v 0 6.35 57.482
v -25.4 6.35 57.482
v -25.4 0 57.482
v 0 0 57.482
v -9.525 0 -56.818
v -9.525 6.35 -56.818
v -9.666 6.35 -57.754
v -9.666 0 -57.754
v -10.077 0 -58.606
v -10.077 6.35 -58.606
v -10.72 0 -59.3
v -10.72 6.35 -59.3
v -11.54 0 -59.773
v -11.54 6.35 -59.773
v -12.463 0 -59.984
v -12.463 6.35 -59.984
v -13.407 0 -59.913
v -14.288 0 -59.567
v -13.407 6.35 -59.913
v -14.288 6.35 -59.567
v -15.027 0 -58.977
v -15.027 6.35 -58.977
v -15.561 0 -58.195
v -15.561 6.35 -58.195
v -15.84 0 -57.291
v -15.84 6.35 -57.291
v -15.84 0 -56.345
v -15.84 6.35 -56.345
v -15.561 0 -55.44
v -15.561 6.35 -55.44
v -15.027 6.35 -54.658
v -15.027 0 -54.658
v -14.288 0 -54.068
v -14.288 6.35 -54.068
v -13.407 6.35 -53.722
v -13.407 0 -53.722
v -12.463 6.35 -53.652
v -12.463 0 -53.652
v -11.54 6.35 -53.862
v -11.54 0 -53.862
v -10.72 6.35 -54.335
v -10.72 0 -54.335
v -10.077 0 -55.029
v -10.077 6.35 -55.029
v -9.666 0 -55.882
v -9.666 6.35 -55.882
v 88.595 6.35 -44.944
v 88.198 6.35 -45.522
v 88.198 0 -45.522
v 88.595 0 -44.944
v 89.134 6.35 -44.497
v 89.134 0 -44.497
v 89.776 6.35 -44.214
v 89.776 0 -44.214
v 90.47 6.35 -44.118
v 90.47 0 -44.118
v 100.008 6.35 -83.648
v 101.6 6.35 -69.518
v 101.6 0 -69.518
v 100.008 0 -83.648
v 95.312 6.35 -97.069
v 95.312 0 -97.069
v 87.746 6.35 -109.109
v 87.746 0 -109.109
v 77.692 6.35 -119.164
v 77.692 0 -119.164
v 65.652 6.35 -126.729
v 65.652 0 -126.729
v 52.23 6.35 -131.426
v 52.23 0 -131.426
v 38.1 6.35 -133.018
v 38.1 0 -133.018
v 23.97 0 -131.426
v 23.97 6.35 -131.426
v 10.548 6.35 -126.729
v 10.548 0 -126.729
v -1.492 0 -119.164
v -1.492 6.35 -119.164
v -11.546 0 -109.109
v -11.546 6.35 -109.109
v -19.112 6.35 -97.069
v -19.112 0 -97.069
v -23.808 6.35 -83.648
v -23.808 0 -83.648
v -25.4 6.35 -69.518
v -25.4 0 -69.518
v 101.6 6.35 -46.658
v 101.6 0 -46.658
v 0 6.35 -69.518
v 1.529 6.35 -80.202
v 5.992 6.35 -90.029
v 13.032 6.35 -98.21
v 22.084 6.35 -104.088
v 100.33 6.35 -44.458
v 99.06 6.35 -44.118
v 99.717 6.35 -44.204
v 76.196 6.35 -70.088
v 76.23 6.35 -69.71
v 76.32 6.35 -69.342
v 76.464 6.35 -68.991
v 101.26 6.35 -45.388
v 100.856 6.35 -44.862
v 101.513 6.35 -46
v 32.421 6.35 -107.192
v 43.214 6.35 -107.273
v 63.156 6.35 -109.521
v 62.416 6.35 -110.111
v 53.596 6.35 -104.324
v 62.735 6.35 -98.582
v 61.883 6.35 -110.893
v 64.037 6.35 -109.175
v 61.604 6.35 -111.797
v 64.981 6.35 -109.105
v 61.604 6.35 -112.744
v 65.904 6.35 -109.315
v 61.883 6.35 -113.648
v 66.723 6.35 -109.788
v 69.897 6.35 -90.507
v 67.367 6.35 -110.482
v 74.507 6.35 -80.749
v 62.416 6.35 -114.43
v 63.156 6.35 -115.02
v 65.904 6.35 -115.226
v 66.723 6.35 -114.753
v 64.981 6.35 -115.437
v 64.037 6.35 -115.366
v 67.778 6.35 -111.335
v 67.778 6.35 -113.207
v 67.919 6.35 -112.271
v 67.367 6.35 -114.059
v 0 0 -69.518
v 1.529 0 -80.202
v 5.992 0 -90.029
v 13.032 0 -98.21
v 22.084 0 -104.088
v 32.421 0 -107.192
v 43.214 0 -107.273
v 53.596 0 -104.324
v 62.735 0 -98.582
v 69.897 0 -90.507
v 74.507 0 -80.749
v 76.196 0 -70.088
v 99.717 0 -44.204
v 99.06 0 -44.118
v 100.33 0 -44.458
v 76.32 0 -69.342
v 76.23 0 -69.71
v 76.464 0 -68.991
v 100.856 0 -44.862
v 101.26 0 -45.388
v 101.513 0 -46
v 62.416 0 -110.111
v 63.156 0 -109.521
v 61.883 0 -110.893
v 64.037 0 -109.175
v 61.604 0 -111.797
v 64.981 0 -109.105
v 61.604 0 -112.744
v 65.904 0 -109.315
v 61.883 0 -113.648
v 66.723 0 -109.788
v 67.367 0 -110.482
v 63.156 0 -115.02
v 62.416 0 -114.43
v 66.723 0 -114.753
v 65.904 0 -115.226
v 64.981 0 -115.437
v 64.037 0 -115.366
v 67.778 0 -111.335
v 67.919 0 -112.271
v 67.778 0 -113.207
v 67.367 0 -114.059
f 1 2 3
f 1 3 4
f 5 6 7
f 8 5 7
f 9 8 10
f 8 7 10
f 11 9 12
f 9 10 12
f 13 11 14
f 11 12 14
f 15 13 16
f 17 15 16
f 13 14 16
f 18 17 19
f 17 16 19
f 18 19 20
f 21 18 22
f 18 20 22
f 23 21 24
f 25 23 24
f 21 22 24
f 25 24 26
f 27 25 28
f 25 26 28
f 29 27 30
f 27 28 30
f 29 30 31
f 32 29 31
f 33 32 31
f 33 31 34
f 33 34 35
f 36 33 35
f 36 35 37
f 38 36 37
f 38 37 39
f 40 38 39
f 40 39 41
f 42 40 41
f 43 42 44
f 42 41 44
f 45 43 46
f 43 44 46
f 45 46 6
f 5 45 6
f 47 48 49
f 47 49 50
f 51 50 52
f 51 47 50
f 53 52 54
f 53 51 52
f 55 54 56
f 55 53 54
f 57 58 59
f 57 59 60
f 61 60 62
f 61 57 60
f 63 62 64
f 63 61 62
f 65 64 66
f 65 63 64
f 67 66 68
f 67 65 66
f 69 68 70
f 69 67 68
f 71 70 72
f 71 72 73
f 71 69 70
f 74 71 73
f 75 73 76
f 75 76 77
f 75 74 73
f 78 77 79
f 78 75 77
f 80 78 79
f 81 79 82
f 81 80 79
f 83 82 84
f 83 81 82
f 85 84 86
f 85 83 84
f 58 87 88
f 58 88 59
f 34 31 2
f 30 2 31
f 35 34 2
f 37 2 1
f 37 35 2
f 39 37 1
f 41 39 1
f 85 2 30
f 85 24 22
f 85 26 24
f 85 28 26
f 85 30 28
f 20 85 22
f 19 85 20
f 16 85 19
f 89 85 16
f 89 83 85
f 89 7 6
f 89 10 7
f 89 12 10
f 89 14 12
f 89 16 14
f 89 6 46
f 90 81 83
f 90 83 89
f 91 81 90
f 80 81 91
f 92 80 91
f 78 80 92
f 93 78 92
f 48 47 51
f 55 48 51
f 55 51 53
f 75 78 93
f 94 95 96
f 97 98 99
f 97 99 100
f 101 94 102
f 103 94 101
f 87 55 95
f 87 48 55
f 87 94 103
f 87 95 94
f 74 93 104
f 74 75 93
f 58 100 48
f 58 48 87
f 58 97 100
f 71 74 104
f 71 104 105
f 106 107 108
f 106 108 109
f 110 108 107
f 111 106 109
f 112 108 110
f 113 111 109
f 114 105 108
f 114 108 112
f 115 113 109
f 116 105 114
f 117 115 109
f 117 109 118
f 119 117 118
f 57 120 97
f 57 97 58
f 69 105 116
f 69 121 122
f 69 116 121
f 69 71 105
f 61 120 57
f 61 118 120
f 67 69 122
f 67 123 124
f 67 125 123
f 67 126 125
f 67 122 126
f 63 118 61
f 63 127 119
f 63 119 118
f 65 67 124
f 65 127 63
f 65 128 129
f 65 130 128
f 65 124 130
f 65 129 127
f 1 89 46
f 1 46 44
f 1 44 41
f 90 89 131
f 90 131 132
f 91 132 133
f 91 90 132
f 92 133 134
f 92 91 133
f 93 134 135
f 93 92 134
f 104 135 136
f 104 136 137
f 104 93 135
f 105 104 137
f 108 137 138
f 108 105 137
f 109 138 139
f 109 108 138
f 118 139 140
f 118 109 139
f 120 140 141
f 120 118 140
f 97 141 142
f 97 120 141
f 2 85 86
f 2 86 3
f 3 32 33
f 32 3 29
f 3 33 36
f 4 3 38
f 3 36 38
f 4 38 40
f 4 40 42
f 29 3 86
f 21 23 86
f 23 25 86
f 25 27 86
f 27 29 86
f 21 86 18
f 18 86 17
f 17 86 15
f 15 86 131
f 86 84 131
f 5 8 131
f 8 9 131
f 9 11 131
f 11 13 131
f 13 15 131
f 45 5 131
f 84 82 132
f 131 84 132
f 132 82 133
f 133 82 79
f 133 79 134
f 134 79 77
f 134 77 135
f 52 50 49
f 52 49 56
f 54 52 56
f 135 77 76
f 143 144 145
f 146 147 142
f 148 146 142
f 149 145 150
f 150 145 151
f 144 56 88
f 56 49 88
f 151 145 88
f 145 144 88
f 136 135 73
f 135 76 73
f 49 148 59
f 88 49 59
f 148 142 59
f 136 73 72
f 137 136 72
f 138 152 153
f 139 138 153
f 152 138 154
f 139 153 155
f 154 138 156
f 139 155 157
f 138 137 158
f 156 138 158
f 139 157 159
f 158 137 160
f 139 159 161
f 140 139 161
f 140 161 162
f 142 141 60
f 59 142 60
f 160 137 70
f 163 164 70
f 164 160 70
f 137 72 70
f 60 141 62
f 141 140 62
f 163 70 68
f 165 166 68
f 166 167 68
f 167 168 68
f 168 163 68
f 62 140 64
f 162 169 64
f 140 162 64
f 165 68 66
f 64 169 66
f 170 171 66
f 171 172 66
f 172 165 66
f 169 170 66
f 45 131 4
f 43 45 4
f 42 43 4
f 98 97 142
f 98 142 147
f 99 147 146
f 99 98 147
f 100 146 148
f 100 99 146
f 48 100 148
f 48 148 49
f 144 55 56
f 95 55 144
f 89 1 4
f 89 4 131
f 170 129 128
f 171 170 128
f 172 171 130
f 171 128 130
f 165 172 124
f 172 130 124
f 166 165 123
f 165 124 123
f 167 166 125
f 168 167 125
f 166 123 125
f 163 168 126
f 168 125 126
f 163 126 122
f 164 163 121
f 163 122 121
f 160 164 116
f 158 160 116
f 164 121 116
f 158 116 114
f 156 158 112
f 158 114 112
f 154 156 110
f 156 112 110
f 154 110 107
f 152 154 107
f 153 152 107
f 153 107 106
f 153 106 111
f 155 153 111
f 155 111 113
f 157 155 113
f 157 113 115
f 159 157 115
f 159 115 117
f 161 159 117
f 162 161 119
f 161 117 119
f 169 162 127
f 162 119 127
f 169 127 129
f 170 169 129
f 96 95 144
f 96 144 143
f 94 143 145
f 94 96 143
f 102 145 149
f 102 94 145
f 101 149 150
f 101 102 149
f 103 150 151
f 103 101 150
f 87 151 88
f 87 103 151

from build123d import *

# Parameters (mm, degrees)
SKETCH1_R           = 3.175
BOSS_EXTRUDE1_DEPTH = 6.35


with BuildPart() as part:
    # Sketch1 → Boss-Extrude1 (new body)
    with BuildSketch(Plane(origin=(0, 6.35, 0), x_dir=(1, 0, 0), z_dir=(0, 1, 0))):
        with BuildLine():
            Line((90.469806331, 44.117768919), (99.06, 44.117768919))
            ThreePointArc((99.06, 44.117768919), (100.856051224, 44.861717695), (101.6, 46.657768919))
            Line((101.6, 46.657768919), (101.6, 69.517768919))
            ThreePointArc((101.6, 69.517768919), (38.1, 133.017768919), (-25.4, 69.517768919))
            Line((-25.4, 69.517768919), (-25.4, -57.482231081))
            Line((-25.4, -57.482231081), (0, -57.482231081))
            Line((0, -57.482231081), (0, 69.517768919))
            ThreePointArc((0, 69.517768919), (37.814649281, 107.616700334), (76.19572572, 70.088454351))
            ThreePointArc((76.19572572, 70.088454351), (76.267828346, 69.524429509), (76.463595703, 68.990577514))
            Line((76.463595703, 68.990577514), (88.197961266, 45.521846387))
            ThreePointArc((88.197961266, 45.521846387), (89.134449307, 44.497115866), (90.469806331, 44.117768919))
        make_face()
        with Locations((64.743779314, 112.270663754)):
            Circle(SKETCH1_R, mode=Mode.SUBTRACT)
        with Locations((-12.7, 56.817768919)):
            Circle(SKETCH1_R, mode=Mode.SUBTRACT)
    extrude(amount=-BOSS_EXTRUDE1_DEPTH)


solid = part.part
